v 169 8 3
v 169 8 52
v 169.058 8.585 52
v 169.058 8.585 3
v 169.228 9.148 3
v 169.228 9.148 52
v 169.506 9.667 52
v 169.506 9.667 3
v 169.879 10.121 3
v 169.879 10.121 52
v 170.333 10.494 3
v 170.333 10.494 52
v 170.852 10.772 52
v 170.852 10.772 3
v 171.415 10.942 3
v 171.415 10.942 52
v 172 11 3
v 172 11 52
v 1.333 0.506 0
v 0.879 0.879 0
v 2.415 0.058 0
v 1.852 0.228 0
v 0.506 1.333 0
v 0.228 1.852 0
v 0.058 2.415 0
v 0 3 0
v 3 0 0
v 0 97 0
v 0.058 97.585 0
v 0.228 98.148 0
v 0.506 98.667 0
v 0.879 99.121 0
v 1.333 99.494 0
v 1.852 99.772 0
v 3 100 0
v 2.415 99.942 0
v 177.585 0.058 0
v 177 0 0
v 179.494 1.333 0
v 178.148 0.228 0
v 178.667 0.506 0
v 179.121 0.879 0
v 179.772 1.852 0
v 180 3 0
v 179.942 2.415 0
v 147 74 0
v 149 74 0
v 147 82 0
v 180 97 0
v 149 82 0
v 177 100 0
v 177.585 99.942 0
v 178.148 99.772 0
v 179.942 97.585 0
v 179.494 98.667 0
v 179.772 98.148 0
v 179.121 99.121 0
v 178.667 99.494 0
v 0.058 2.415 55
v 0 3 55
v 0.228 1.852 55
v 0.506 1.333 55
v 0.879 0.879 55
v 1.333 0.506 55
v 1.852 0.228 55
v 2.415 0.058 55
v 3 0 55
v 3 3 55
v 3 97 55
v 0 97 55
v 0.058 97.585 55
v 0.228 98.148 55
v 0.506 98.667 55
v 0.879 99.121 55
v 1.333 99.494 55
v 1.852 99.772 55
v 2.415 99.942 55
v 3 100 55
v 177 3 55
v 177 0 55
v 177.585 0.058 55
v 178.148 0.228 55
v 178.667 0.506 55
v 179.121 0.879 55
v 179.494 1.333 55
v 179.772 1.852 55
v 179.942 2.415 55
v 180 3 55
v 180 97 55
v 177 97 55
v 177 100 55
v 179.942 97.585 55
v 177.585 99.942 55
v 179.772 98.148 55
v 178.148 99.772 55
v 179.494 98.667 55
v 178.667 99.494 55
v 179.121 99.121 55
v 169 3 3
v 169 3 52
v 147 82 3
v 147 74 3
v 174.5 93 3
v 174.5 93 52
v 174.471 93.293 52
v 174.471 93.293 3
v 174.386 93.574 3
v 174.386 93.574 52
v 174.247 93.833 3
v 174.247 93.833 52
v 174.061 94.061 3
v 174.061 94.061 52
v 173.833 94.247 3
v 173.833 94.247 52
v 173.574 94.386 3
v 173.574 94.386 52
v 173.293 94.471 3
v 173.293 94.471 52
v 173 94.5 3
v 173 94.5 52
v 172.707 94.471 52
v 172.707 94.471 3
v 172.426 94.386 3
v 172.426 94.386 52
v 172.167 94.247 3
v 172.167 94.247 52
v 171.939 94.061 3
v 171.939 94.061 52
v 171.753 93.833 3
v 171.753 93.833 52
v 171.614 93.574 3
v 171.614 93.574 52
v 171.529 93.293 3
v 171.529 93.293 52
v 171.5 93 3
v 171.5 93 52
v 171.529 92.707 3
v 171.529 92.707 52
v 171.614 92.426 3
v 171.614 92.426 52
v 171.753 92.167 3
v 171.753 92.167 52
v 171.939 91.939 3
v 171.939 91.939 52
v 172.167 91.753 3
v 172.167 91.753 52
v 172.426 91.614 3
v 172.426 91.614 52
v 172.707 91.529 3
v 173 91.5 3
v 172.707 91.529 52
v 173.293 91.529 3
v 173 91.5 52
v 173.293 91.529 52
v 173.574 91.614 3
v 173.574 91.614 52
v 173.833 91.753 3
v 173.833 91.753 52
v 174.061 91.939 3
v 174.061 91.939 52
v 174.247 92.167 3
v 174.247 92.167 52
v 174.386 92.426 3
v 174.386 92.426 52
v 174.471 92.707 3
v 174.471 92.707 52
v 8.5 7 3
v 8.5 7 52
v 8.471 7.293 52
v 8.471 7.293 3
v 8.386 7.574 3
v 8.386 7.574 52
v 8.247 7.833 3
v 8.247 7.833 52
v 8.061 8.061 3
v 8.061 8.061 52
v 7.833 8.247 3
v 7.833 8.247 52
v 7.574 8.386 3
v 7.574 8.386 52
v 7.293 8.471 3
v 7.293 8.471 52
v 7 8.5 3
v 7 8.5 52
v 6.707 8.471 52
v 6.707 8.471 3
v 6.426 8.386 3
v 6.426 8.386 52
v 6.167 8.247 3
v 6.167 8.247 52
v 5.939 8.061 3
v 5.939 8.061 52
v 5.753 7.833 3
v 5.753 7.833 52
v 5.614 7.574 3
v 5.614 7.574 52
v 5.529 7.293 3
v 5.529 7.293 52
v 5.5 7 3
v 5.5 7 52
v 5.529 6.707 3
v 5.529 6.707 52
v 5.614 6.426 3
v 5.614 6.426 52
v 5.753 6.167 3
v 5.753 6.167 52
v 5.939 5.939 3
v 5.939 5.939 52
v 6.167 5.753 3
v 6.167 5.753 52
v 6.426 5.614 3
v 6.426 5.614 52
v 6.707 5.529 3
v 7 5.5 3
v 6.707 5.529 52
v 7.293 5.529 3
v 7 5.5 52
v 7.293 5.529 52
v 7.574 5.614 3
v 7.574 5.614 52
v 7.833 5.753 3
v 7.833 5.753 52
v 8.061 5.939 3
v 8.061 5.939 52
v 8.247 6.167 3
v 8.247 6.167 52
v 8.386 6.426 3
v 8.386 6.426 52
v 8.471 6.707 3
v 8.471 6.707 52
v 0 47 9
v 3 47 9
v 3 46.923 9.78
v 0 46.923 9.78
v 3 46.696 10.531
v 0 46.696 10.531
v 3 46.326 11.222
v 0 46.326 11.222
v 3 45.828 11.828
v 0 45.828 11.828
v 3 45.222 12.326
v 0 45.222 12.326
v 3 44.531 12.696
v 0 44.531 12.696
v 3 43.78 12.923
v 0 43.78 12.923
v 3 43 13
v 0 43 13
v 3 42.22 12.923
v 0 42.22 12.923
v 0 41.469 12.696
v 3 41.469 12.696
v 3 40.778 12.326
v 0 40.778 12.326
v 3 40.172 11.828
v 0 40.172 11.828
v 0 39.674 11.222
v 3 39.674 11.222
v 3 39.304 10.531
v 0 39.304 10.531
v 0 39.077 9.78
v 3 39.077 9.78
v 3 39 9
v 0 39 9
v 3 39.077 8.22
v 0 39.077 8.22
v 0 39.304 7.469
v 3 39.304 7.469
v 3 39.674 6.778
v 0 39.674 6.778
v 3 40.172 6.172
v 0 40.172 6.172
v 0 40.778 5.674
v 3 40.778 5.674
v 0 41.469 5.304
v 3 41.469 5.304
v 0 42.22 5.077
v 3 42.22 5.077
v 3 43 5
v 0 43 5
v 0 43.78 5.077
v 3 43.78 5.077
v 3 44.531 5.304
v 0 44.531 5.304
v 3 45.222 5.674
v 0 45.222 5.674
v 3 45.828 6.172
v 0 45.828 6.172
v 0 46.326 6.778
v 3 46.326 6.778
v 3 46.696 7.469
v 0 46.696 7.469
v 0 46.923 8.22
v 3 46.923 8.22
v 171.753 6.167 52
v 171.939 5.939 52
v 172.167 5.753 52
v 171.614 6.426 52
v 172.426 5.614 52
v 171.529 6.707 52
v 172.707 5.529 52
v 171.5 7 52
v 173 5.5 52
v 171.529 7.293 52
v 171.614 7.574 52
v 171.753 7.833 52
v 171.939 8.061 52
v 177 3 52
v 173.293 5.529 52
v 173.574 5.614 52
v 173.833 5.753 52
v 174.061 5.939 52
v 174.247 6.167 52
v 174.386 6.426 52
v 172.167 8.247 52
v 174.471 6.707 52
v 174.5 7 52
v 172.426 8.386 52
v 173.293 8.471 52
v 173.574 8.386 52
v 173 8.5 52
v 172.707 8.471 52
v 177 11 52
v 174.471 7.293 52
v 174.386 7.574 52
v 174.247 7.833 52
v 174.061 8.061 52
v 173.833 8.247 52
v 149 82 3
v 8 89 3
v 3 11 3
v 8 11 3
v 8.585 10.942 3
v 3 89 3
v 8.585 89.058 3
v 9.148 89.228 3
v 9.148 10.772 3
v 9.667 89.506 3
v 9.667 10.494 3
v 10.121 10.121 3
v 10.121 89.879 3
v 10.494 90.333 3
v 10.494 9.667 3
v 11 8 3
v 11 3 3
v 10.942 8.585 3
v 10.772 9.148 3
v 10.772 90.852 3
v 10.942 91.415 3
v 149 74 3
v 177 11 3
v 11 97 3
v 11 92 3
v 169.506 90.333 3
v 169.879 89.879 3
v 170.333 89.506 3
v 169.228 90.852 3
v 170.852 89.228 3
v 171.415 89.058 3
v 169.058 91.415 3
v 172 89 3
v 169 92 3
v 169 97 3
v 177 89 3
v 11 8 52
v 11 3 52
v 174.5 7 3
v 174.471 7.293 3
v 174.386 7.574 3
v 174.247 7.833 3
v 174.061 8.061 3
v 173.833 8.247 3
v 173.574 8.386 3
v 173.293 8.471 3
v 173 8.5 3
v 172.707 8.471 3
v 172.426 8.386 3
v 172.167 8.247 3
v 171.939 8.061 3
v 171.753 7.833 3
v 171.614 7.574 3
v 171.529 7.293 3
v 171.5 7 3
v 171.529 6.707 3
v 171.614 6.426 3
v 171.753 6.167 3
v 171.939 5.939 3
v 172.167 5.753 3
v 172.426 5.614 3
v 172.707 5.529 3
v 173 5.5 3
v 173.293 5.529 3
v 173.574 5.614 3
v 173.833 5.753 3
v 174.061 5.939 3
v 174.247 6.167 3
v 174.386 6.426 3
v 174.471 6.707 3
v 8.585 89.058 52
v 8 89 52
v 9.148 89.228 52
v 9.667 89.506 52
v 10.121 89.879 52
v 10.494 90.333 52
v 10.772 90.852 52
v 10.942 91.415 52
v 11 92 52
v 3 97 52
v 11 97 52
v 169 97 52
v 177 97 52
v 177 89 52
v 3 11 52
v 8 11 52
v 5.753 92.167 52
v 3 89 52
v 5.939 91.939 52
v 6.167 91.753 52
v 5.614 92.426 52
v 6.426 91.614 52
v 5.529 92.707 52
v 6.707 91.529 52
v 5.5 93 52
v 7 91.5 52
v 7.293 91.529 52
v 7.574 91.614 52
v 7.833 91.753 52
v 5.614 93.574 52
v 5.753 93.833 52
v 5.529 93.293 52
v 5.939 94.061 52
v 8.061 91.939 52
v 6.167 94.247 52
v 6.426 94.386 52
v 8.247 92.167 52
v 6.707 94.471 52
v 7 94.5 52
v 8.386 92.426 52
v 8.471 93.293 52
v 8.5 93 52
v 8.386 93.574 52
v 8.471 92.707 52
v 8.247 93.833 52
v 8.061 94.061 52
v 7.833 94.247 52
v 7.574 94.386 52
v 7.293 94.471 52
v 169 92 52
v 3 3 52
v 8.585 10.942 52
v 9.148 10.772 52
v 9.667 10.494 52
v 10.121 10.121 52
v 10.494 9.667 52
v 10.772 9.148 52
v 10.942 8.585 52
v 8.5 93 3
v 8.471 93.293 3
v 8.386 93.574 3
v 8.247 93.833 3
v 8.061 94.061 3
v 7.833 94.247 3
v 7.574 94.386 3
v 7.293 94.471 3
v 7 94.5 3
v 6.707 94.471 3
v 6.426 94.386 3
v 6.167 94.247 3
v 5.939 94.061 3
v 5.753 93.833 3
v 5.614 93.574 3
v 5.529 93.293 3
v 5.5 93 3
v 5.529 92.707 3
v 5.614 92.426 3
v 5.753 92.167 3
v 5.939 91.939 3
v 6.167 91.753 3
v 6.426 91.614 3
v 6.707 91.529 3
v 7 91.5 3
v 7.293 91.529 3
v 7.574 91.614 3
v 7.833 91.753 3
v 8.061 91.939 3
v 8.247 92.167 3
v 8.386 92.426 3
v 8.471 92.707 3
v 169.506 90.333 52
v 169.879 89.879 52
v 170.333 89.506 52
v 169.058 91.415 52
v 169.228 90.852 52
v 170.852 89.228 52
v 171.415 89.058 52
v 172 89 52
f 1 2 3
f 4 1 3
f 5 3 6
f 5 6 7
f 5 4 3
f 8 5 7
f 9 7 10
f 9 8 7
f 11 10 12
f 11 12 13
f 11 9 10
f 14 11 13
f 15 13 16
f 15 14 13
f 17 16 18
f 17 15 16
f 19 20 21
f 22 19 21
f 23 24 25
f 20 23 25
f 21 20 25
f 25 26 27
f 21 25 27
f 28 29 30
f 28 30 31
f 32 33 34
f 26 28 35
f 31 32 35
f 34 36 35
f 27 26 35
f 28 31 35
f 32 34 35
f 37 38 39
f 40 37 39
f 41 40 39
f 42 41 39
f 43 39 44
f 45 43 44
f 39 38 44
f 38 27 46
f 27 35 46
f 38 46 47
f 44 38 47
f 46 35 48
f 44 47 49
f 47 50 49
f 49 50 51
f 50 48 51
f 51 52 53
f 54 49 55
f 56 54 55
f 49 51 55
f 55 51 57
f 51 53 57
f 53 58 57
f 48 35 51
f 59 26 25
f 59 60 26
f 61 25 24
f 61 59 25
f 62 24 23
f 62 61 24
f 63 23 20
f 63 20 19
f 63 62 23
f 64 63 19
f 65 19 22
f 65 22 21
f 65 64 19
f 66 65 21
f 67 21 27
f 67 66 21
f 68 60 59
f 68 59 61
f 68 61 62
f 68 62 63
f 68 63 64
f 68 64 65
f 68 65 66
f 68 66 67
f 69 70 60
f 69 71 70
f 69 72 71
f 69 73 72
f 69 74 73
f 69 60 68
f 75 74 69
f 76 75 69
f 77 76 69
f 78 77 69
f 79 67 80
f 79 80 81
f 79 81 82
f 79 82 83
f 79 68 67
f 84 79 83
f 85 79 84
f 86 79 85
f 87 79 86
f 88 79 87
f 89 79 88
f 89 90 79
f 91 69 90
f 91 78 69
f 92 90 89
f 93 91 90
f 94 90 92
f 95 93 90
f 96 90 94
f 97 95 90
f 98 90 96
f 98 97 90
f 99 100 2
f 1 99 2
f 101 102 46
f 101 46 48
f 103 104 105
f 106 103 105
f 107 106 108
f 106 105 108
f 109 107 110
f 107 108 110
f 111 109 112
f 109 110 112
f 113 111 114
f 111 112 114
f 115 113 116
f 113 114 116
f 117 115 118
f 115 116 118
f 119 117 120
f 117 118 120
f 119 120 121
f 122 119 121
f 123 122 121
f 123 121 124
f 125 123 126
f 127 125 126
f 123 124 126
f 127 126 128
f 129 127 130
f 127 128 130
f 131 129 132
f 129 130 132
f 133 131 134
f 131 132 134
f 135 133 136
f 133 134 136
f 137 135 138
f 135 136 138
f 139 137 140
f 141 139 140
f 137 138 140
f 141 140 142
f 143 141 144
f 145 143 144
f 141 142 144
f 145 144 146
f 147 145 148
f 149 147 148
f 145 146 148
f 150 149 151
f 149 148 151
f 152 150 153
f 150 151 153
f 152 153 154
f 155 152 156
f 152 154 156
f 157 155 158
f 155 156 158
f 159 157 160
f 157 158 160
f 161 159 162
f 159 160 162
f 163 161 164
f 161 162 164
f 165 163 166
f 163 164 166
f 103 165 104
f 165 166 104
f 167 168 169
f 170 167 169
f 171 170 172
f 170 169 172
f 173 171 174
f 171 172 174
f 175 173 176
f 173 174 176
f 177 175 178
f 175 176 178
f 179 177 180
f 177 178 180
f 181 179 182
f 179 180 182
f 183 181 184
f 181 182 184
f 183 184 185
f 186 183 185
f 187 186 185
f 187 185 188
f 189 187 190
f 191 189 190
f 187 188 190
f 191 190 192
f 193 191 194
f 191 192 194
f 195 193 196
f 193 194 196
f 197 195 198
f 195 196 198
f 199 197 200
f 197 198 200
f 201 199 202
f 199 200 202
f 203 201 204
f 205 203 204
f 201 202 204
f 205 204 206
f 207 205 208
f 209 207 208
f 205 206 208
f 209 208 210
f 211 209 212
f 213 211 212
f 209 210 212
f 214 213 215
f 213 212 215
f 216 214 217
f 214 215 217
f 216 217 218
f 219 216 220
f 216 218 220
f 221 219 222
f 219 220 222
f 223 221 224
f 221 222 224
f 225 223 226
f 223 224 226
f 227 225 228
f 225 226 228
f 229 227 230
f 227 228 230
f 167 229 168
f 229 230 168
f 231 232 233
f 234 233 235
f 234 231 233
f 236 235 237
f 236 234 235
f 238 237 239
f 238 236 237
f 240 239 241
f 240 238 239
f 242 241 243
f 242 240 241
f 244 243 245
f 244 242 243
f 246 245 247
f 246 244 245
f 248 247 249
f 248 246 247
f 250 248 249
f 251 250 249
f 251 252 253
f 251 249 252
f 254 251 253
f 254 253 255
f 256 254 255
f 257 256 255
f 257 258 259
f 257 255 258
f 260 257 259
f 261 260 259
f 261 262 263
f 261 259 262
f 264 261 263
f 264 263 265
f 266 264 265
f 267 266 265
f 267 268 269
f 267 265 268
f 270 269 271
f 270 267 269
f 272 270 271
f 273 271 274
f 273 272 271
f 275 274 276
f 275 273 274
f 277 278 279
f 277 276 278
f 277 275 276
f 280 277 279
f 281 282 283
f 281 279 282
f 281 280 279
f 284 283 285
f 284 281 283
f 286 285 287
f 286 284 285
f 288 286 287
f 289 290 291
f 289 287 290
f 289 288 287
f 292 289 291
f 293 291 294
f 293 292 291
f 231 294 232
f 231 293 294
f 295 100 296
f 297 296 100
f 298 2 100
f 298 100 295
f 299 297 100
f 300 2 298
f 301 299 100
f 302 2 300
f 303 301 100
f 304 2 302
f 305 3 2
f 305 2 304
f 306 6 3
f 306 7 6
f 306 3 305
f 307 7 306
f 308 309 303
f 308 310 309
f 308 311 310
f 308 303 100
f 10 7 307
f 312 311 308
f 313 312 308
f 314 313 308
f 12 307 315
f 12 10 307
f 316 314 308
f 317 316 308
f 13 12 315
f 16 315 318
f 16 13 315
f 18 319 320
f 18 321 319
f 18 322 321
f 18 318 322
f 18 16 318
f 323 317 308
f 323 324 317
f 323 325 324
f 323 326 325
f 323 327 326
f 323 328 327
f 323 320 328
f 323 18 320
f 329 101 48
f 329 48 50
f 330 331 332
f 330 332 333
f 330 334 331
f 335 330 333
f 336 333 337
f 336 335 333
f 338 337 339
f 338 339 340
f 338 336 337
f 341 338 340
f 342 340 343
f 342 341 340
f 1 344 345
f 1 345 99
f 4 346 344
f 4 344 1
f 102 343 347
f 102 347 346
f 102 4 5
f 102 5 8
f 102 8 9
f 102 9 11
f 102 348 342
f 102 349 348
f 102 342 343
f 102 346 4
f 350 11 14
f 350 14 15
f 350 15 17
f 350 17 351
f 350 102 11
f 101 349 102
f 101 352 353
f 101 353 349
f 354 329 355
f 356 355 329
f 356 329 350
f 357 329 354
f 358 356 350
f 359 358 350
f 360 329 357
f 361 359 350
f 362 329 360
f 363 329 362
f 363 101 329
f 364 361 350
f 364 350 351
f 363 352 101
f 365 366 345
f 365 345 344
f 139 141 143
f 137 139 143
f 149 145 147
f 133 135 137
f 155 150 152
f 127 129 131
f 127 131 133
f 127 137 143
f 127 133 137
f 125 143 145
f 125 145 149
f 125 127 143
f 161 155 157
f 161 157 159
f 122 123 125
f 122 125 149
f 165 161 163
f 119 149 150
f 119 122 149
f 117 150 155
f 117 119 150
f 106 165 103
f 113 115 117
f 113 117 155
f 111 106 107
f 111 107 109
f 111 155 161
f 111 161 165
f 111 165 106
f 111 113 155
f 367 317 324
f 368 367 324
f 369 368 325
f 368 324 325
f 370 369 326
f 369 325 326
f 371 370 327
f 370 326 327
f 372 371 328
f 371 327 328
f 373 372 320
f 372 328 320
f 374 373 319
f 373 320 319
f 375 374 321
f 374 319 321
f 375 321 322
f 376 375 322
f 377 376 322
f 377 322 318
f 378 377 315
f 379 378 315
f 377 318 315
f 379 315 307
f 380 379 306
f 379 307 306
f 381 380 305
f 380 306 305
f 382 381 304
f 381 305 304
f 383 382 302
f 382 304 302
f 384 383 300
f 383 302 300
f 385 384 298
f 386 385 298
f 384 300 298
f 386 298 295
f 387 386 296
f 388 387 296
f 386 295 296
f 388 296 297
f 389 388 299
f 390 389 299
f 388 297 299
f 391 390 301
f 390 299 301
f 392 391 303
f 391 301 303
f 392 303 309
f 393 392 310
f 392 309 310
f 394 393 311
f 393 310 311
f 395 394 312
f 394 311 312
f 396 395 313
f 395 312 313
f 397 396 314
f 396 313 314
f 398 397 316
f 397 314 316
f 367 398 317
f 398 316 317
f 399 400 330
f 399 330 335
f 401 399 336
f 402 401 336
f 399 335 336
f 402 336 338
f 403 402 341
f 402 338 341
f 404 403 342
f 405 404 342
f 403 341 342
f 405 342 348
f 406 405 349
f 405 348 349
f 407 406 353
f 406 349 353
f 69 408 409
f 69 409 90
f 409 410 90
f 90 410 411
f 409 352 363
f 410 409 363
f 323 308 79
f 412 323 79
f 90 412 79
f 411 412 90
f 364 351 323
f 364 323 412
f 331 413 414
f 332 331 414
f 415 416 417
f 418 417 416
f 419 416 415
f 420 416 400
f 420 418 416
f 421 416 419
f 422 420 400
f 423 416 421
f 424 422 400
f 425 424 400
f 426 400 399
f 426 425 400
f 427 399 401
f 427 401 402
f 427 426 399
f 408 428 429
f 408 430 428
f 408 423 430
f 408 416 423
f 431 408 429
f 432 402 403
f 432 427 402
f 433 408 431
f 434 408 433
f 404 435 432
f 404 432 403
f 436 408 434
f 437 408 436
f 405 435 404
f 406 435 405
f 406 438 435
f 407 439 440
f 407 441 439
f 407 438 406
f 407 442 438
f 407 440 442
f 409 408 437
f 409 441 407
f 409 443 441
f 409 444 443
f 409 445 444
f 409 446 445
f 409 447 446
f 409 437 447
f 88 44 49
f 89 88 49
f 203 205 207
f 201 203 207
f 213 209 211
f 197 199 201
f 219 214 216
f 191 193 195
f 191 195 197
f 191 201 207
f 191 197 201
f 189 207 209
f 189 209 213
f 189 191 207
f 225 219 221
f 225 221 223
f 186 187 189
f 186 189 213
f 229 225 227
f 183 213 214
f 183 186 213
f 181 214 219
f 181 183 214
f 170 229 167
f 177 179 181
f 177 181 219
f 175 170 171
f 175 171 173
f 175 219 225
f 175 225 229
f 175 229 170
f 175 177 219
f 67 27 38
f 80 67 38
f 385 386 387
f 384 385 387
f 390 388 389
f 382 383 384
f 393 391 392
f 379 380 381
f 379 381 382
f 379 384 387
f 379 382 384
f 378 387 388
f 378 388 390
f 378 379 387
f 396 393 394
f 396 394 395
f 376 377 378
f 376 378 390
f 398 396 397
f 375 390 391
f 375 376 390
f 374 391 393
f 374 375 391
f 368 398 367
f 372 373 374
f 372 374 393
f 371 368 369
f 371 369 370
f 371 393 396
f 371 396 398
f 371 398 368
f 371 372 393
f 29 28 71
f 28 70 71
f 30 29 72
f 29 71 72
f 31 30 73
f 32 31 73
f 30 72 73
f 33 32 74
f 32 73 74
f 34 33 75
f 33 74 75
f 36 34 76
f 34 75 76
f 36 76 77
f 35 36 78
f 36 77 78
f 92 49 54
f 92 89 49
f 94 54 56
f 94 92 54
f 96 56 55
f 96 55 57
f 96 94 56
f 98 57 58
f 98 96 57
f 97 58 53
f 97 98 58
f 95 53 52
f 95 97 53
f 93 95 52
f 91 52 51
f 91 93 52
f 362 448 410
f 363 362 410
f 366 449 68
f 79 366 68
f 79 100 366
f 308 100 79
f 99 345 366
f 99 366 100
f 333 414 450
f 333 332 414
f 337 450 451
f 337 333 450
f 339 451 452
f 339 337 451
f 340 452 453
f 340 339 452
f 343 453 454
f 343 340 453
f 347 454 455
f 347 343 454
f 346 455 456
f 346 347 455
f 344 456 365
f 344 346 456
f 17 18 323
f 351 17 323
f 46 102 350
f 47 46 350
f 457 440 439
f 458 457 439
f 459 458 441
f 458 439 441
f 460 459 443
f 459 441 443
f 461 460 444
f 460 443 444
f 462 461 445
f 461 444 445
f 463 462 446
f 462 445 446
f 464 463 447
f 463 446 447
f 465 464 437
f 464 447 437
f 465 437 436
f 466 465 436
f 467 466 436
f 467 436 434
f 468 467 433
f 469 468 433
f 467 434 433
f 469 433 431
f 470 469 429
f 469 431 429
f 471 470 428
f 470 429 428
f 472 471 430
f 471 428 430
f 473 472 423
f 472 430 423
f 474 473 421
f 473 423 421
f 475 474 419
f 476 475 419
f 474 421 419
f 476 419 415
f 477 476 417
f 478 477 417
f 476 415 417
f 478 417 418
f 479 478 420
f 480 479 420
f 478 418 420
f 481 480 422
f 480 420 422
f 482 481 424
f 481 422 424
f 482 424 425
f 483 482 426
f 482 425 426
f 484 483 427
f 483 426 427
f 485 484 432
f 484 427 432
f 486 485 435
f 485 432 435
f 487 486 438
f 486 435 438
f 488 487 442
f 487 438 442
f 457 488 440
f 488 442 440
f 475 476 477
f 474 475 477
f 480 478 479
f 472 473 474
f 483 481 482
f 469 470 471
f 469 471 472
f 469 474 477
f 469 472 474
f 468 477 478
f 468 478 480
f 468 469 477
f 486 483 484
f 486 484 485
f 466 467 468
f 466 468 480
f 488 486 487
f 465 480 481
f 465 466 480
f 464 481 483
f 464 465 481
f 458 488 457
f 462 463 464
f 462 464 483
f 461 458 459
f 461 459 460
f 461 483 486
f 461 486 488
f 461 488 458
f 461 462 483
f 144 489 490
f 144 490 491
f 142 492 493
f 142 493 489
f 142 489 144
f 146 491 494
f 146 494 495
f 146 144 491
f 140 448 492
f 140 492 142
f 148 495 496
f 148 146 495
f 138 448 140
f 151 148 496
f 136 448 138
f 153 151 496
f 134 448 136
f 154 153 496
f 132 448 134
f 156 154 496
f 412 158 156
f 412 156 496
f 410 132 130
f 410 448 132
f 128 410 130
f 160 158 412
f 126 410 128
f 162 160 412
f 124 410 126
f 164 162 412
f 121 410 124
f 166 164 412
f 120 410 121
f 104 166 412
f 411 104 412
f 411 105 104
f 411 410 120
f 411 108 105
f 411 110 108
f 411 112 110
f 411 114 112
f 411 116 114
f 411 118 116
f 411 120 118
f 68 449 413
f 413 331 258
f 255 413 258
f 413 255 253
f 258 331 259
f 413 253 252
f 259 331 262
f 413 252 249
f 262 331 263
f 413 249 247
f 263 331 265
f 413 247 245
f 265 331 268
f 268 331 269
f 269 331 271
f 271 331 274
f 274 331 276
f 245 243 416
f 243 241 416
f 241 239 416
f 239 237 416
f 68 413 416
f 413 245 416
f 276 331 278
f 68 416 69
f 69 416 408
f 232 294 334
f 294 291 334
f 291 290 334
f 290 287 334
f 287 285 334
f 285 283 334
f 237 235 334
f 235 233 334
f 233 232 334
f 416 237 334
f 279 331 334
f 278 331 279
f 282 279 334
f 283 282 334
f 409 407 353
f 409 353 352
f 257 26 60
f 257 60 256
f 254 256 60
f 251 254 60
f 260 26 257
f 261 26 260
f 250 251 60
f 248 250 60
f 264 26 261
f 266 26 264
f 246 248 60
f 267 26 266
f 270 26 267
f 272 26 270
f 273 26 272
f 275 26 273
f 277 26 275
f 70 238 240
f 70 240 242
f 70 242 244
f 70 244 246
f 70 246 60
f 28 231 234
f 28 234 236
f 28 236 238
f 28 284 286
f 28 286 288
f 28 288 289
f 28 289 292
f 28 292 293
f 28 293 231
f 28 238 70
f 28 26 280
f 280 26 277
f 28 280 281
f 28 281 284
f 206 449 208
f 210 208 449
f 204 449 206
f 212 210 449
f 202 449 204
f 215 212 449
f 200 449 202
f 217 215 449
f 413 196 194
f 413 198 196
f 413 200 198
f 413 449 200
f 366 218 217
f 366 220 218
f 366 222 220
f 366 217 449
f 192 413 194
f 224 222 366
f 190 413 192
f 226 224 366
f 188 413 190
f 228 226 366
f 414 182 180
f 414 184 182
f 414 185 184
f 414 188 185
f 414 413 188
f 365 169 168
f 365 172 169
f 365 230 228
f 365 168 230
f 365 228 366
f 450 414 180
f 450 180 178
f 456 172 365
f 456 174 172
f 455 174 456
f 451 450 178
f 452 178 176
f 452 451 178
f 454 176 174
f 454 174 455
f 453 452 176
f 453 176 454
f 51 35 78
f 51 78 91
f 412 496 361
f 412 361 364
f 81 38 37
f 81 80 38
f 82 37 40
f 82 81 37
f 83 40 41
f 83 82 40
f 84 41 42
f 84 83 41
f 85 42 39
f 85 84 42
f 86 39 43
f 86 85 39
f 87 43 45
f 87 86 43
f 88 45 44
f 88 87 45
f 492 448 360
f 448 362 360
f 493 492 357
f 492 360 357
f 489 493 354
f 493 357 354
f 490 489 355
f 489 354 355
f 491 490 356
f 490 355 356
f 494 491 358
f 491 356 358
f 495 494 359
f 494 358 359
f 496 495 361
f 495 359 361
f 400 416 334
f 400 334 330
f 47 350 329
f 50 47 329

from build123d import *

# Parameters (mm, degrees)
SKETCH_W        = 180
SKETCH_H        = 100
PAD_DEPTH       = 55
THICKNESS_T     = -3
SKETCH001_R     = 4
POCKET_DEPTH    = 16
PAD004_START    = -8
SKETCH005_W     = 8
SKETCH005_H     = 8
SKETCH005_R     = 1.5
PAD004_DEPTH    = 49
SKETCH008_W     = 2
SKETCH008_H     = 8
POCKET002_DEPTH = 3
FILLET_R        = 3
FILLET001_R     = 3


with BuildPart() as part:
    # Sketch (on XY_Plane of Origin) → Pad (new body)
    with BuildSketch(Plane.XY):
        with Locations((90, 50)):
            Rectangle(SKETCH_W, SKETCH_H)
    extrude(amount=PAD_DEPTH)

    # Thickness
    thickness_openings = [part.faces().sort_by_distance(p)[0] for p in [
        (90, 50, 55),
    ]]
    offset(amount=THICKNESS_T, openings=thickness_openings)

    # Sketch001 (on YZ_Plane of Origin) → Pocket (cut)
    with BuildSketch(Plane.YZ):
        with Locations((43, 9)):
            Circle(SKETCH001_R)
    extrude(amount=POCKET_DEPTH, mode=Mode.SUBTRACT)

    # Sketch005 → Pad004 (join)
    with BuildSketch(Plane.XY.offset(60).offset(PAD004_START)):
        with Locations((7, 93)):
            Rectangle(SKETCH005_W, SKETCH005_H)
        with Locations((7, 93)):
            Circle(SKETCH005_R, mode=Mode.SUBTRACT)
        with Locations((173, 7)):
            Rectangle(SKETCH005_W, SKETCH005_H)
        with Locations((173, 7)):
            Circle(SKETCH005_R, mode=Mode.SUBTRACT)
        with Locations((173, 93)):
            Rectangle(SKETCH005_W, SKETCH005_H)
        with Locations((173, 93)):
            Circle(SKETCH005_R, mode=Mode.SUBTRACT)
        with Locations((7, 7)):
            Rectangle(SKETCH005_W, SKETCH005_H)
        with Locations((7, 7)):
            Circle(SKETCH005_R, mode=Mode.SUBTRACT)
    extrude(amount=-PAD004_DEPTH)

    # Sketch008 (on Face14 of Pad004) → Pocket002 (cut)
    with BuildSketch(Plane.XY.offset(3)):
        with Locations((148, 78)):
            Rectangle(SKETCH008_W, SKETCH008_H)
    extrude(amount=-POCKET002_DEPTH, mode=Mode.SUBTRACT)

    # Fillet
    fillet_edges = [part.edges().sort_by_distance(p)[0] for p in [
        (11, 11, 27.5),
        (169, 11, 27.5),
        (169, 89, 27.5),
        (11, 89, 27.5),
    ]]
    fillet(fillet_edges, radius=FILLET_R)

    # Fillet001
    fillet001_edges = [part.edges().sort_by_distance(p)[0] for p in [
        (180, 0, 27.5),
        (180, 100, 27.5),
        (0, 0, 27.5),
        (0, 100, 27.5),
    ]]
    fillet(fillet001_edges, radius=FILLET001_R)


solid = part.part
